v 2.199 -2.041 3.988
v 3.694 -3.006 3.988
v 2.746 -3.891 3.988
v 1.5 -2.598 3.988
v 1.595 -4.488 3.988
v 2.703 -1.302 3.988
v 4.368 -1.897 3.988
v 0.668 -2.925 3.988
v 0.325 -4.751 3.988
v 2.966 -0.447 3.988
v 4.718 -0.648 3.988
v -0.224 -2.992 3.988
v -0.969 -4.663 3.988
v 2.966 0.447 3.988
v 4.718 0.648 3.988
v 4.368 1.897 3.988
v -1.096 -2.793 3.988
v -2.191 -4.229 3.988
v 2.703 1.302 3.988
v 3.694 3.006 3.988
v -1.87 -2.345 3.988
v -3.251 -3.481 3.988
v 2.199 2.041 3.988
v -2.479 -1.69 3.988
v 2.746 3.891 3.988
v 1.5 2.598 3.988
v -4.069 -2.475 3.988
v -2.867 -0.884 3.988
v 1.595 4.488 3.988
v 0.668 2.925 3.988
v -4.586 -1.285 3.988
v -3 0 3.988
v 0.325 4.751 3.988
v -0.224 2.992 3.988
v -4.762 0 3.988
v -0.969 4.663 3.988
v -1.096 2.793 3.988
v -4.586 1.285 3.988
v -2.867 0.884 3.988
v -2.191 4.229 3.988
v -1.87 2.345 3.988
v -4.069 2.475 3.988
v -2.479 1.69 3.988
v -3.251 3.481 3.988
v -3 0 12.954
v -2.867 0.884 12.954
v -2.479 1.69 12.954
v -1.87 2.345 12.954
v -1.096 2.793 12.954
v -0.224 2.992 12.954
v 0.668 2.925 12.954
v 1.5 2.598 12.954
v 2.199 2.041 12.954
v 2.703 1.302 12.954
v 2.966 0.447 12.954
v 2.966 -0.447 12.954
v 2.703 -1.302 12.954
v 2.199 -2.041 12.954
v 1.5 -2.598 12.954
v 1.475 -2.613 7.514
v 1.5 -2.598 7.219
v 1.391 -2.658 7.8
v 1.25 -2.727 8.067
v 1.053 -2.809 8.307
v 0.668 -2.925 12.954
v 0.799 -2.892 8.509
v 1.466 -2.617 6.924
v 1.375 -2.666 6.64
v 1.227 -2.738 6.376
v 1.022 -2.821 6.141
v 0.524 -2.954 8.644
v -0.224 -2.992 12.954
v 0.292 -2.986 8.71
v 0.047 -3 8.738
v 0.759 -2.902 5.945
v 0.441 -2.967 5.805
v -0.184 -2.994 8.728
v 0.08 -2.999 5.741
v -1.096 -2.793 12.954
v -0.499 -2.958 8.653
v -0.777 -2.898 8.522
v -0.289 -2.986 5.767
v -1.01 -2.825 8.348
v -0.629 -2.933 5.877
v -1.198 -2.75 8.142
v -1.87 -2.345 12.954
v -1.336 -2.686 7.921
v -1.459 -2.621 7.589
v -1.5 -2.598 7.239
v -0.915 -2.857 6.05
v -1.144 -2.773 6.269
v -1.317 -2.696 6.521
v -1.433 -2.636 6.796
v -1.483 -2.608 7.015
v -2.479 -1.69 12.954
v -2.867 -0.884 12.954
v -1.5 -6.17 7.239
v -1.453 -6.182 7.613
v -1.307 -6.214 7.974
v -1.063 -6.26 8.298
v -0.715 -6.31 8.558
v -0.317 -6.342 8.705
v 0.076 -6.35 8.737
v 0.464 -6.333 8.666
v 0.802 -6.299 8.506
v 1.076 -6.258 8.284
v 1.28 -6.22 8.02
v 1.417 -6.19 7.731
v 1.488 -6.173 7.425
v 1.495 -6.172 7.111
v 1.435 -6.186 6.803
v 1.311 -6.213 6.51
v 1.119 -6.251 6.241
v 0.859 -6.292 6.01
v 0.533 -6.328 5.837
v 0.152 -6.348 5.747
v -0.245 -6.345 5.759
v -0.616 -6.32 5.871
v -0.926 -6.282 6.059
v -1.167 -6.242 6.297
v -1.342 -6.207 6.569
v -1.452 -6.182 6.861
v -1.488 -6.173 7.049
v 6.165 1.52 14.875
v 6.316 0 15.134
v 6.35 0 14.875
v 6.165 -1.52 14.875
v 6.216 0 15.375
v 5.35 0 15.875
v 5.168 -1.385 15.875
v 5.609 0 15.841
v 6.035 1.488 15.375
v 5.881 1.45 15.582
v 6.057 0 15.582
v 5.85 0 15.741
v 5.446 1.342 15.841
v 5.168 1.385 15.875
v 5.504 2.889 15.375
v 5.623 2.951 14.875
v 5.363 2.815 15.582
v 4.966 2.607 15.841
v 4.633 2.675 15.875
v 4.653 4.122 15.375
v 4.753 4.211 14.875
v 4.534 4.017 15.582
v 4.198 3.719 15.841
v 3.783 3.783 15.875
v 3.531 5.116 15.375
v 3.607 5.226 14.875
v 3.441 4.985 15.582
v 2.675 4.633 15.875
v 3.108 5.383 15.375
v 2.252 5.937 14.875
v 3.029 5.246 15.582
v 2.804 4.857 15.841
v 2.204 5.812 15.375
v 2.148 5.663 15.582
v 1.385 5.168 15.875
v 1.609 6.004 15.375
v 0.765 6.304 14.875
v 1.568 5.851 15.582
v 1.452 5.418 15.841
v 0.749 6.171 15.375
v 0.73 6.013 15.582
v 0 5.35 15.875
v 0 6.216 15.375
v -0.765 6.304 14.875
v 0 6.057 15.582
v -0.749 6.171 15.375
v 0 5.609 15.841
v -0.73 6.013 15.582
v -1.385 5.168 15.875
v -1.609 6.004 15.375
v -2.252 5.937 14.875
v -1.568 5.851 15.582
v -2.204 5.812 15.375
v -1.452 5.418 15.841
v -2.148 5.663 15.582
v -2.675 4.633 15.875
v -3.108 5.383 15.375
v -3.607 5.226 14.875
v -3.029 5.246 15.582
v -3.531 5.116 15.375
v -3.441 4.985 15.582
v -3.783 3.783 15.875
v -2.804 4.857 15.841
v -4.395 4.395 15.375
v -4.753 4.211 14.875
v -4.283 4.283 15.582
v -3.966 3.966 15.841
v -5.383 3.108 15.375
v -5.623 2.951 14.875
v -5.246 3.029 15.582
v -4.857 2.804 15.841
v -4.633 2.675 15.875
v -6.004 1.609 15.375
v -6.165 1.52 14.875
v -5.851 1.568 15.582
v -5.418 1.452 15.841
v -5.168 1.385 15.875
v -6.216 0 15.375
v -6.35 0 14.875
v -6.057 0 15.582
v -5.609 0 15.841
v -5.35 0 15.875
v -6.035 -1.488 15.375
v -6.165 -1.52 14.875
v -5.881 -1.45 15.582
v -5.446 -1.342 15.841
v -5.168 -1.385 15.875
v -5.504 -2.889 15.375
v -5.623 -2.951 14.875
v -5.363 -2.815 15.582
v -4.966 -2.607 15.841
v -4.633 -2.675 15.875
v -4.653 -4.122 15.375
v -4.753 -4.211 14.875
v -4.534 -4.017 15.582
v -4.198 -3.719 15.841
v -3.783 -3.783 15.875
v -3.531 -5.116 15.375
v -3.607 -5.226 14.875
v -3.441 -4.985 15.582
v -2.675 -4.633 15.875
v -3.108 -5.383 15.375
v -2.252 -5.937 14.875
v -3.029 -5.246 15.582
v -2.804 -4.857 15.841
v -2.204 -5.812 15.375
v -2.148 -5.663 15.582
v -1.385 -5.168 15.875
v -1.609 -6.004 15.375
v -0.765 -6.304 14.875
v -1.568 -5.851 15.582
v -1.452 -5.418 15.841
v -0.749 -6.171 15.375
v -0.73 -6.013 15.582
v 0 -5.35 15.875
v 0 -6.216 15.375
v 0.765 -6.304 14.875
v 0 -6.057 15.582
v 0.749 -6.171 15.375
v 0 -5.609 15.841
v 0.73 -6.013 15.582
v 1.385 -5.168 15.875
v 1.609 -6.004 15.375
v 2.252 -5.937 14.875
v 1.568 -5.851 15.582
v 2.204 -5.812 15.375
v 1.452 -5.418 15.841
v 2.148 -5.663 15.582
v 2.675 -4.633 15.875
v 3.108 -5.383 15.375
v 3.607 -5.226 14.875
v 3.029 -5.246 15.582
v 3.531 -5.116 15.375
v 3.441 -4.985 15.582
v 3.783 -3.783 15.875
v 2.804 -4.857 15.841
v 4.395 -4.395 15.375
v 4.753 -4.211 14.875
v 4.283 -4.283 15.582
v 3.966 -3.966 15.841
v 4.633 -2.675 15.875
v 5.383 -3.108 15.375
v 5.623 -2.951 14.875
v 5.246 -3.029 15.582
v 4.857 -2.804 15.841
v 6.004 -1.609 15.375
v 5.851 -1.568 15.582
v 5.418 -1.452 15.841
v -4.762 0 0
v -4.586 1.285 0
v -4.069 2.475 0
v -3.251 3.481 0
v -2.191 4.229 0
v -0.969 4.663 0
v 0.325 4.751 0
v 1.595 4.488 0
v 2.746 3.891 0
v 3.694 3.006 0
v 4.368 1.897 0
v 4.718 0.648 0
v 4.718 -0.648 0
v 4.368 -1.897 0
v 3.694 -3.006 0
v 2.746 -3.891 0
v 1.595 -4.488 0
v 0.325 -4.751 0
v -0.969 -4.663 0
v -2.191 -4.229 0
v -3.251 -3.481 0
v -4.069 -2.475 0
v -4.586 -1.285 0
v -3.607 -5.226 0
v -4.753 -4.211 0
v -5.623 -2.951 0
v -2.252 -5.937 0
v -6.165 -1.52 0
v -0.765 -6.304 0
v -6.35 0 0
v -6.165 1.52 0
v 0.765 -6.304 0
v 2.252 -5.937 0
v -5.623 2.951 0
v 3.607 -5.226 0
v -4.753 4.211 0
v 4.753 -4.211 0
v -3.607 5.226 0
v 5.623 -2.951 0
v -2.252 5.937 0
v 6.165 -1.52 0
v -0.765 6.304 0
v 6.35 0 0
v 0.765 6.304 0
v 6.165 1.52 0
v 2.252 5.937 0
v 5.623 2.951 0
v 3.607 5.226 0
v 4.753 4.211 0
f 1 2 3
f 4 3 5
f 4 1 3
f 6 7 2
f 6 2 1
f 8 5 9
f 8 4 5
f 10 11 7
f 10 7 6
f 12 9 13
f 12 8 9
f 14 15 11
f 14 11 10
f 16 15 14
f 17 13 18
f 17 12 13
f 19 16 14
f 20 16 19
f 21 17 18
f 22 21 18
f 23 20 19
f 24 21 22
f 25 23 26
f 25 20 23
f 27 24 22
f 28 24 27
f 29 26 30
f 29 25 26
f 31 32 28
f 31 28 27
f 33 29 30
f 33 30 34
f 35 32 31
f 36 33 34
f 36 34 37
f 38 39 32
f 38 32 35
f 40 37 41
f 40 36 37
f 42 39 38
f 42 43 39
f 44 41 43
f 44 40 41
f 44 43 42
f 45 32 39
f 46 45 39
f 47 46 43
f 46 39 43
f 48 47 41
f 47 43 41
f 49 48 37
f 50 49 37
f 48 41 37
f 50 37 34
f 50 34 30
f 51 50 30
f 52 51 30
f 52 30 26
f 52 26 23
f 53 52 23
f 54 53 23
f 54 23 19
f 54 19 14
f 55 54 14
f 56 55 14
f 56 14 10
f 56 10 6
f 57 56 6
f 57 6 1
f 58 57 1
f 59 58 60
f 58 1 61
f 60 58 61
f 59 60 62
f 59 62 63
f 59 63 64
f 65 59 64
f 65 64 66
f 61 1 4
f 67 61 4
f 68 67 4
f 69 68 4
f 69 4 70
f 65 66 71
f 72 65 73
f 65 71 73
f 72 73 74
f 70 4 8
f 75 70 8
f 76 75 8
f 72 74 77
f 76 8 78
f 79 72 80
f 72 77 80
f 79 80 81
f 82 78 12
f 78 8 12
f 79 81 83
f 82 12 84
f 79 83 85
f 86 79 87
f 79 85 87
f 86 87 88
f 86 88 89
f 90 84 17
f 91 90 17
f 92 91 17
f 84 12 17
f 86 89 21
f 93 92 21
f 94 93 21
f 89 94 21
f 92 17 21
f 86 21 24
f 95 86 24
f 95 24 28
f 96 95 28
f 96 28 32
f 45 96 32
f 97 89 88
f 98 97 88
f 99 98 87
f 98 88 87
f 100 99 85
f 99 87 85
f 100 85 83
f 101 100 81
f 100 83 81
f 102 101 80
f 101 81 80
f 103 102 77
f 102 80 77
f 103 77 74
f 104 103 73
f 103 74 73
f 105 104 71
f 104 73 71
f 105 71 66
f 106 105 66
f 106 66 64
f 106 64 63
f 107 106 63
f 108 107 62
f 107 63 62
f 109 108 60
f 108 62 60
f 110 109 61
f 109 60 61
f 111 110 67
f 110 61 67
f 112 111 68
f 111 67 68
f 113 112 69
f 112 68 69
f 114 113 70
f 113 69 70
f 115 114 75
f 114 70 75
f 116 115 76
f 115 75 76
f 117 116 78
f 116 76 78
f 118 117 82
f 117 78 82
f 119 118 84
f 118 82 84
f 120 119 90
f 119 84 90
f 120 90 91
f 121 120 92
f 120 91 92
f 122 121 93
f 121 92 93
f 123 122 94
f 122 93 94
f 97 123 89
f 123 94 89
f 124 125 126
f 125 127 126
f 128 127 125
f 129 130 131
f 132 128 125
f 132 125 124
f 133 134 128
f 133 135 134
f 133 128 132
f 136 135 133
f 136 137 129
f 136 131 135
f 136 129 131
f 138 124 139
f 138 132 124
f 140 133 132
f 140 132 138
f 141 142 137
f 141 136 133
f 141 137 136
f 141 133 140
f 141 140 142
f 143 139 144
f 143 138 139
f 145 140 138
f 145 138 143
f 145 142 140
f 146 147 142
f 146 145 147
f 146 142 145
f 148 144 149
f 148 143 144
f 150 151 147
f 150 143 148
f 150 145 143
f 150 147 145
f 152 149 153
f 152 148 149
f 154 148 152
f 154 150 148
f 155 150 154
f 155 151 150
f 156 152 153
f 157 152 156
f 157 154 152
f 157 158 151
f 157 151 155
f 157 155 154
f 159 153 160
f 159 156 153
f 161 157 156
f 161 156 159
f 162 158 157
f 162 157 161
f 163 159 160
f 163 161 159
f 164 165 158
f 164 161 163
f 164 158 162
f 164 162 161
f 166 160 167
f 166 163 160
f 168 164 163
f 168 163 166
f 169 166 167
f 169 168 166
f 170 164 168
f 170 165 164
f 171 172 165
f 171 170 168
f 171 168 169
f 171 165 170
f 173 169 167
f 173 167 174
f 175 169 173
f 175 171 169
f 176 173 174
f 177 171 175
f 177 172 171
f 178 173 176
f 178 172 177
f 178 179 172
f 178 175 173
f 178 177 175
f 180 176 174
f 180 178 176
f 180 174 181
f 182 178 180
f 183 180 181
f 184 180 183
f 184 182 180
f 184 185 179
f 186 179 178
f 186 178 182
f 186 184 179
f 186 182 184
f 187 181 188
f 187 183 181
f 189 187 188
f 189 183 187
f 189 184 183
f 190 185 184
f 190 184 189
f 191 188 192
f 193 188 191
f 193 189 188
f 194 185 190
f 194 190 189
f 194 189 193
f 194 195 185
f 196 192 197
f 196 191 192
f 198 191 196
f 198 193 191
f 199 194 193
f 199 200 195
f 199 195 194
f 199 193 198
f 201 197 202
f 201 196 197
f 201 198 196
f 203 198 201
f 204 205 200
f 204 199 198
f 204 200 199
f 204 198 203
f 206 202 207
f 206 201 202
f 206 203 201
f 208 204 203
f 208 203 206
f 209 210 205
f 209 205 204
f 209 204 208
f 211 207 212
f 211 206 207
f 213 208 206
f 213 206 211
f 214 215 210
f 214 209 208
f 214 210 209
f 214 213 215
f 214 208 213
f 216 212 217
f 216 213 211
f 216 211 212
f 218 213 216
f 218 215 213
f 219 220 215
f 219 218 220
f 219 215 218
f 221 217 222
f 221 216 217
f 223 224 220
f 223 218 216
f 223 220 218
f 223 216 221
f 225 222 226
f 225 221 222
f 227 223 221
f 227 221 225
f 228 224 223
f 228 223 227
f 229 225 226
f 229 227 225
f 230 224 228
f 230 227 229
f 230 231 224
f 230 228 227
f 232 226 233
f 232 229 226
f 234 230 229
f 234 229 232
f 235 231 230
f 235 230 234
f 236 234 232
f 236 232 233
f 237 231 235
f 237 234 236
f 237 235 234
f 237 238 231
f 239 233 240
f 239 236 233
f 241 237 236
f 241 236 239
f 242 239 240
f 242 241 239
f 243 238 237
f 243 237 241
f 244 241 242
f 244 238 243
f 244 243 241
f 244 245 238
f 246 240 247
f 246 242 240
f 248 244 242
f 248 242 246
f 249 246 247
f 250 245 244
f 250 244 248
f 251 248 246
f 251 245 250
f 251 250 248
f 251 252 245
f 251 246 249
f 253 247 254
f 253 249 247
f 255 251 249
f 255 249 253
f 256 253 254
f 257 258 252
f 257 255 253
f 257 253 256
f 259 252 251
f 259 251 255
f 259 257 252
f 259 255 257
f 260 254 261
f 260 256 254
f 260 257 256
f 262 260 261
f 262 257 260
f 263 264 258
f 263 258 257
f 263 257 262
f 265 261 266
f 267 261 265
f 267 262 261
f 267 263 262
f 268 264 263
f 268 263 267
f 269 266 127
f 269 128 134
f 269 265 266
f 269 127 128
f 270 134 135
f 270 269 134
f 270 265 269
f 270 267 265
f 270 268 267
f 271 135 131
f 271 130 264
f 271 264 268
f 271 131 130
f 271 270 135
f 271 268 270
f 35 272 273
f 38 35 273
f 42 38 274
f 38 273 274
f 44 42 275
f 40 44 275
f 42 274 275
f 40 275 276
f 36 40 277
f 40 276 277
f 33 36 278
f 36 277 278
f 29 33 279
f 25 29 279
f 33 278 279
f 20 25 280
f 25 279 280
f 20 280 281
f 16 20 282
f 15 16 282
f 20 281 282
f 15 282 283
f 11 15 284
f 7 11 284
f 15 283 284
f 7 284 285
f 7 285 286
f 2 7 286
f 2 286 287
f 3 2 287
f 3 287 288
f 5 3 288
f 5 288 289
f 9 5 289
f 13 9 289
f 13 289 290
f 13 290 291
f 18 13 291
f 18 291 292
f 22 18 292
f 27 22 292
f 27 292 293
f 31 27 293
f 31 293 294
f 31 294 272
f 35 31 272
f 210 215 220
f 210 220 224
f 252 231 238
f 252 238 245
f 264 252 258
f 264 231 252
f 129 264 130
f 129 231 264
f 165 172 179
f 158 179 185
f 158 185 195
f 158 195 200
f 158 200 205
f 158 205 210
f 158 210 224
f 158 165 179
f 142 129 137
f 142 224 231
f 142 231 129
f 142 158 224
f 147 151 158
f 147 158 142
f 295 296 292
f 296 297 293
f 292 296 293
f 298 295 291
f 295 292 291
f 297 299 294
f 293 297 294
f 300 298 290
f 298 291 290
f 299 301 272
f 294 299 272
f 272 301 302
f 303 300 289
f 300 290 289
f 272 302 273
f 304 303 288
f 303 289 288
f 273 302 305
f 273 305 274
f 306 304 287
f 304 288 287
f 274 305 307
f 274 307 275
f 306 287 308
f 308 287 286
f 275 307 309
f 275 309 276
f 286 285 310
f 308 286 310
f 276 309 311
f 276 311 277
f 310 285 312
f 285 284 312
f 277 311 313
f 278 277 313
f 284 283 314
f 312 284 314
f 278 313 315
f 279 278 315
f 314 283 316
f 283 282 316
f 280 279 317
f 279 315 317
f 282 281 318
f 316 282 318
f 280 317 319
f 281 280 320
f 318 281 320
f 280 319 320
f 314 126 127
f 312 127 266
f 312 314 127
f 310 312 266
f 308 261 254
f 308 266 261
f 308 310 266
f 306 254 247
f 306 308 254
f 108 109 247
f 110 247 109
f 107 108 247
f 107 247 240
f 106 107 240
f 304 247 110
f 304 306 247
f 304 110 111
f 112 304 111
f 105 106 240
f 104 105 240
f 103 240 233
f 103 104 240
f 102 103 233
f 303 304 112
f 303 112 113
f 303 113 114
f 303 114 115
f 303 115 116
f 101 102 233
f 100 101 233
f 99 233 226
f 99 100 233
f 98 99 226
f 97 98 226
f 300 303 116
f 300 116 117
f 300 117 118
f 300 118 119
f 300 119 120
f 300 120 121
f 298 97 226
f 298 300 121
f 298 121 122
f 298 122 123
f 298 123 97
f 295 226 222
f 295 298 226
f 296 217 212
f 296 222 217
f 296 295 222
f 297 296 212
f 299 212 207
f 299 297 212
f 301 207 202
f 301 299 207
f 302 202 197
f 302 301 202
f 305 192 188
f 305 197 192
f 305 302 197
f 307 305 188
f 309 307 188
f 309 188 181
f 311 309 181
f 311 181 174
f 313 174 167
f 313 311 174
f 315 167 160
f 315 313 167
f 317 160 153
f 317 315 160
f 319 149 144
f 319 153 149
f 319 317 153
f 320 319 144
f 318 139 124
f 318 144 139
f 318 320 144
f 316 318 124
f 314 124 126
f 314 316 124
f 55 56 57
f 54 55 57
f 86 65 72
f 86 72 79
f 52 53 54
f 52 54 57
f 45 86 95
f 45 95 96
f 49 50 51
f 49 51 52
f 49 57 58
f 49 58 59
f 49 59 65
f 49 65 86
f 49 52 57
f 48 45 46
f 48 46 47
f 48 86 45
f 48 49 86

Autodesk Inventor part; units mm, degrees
ref_plane "YZ Plane" through (0, 0, 0) normal (1, 0, 0) x (0, 1, 0)
ref_plane "XZ Plane" through (0, 0, 0) normal (0, 1, 0) x (-1, 0, 0)
ref_plane "XY Plane" through (0, 0, 0) normal (0, 0, 1) x (1, 0, 0)
sketch "Sketch1" plane through (0, 0, 0) normal (0, 0, 1) x (1, 0, 0)
  circle A0 centre (0, 0) radius 6.35
  dimension "d0" = 12.7
extrude "Extrusion1" add sketch "Sketch1" along normal blind 15.875
fillet "Fillet1" radius 1 1 edges at (-6.35, 0, 15.875)
sketch "Sketch2" plane through (0, 0, 0) normal (0, 0, -1) x (-1, 0, 0)
  circle A0 centre (0, 0) radius 4.7625
  dimension "d4" = 9.525
extrude "Extrusion2" cut sketch "Sketch2" against normal blind 3.9878
sketch "Sketch3" plane through (0, 0, 3.9878) normal (0, 0, -1) x (-1, 0, 0)
  circle A0 centre (0, 0) radius 3
  dimension "d7" = 6
extrude "Extrusion3" cut sketch "Sketch3" against normal blind 8.9662
sketch "Sketch4" plane through (0, 0, 0) normal (0, 1, 0) x (-1, 0, 0)
  circle A0 centre (0, 7.239) radius 1.5
  line L0 (6.35, 0) -> (-6.35, 0) projected
  point P0 (0, 0)
  dimension "d10" = 3
  dimension "d11" = 7.239
extrude "Extrusion4" cut sketch "Sketch4" against normal blind 16.9418
properties part number "Encoder knob"
